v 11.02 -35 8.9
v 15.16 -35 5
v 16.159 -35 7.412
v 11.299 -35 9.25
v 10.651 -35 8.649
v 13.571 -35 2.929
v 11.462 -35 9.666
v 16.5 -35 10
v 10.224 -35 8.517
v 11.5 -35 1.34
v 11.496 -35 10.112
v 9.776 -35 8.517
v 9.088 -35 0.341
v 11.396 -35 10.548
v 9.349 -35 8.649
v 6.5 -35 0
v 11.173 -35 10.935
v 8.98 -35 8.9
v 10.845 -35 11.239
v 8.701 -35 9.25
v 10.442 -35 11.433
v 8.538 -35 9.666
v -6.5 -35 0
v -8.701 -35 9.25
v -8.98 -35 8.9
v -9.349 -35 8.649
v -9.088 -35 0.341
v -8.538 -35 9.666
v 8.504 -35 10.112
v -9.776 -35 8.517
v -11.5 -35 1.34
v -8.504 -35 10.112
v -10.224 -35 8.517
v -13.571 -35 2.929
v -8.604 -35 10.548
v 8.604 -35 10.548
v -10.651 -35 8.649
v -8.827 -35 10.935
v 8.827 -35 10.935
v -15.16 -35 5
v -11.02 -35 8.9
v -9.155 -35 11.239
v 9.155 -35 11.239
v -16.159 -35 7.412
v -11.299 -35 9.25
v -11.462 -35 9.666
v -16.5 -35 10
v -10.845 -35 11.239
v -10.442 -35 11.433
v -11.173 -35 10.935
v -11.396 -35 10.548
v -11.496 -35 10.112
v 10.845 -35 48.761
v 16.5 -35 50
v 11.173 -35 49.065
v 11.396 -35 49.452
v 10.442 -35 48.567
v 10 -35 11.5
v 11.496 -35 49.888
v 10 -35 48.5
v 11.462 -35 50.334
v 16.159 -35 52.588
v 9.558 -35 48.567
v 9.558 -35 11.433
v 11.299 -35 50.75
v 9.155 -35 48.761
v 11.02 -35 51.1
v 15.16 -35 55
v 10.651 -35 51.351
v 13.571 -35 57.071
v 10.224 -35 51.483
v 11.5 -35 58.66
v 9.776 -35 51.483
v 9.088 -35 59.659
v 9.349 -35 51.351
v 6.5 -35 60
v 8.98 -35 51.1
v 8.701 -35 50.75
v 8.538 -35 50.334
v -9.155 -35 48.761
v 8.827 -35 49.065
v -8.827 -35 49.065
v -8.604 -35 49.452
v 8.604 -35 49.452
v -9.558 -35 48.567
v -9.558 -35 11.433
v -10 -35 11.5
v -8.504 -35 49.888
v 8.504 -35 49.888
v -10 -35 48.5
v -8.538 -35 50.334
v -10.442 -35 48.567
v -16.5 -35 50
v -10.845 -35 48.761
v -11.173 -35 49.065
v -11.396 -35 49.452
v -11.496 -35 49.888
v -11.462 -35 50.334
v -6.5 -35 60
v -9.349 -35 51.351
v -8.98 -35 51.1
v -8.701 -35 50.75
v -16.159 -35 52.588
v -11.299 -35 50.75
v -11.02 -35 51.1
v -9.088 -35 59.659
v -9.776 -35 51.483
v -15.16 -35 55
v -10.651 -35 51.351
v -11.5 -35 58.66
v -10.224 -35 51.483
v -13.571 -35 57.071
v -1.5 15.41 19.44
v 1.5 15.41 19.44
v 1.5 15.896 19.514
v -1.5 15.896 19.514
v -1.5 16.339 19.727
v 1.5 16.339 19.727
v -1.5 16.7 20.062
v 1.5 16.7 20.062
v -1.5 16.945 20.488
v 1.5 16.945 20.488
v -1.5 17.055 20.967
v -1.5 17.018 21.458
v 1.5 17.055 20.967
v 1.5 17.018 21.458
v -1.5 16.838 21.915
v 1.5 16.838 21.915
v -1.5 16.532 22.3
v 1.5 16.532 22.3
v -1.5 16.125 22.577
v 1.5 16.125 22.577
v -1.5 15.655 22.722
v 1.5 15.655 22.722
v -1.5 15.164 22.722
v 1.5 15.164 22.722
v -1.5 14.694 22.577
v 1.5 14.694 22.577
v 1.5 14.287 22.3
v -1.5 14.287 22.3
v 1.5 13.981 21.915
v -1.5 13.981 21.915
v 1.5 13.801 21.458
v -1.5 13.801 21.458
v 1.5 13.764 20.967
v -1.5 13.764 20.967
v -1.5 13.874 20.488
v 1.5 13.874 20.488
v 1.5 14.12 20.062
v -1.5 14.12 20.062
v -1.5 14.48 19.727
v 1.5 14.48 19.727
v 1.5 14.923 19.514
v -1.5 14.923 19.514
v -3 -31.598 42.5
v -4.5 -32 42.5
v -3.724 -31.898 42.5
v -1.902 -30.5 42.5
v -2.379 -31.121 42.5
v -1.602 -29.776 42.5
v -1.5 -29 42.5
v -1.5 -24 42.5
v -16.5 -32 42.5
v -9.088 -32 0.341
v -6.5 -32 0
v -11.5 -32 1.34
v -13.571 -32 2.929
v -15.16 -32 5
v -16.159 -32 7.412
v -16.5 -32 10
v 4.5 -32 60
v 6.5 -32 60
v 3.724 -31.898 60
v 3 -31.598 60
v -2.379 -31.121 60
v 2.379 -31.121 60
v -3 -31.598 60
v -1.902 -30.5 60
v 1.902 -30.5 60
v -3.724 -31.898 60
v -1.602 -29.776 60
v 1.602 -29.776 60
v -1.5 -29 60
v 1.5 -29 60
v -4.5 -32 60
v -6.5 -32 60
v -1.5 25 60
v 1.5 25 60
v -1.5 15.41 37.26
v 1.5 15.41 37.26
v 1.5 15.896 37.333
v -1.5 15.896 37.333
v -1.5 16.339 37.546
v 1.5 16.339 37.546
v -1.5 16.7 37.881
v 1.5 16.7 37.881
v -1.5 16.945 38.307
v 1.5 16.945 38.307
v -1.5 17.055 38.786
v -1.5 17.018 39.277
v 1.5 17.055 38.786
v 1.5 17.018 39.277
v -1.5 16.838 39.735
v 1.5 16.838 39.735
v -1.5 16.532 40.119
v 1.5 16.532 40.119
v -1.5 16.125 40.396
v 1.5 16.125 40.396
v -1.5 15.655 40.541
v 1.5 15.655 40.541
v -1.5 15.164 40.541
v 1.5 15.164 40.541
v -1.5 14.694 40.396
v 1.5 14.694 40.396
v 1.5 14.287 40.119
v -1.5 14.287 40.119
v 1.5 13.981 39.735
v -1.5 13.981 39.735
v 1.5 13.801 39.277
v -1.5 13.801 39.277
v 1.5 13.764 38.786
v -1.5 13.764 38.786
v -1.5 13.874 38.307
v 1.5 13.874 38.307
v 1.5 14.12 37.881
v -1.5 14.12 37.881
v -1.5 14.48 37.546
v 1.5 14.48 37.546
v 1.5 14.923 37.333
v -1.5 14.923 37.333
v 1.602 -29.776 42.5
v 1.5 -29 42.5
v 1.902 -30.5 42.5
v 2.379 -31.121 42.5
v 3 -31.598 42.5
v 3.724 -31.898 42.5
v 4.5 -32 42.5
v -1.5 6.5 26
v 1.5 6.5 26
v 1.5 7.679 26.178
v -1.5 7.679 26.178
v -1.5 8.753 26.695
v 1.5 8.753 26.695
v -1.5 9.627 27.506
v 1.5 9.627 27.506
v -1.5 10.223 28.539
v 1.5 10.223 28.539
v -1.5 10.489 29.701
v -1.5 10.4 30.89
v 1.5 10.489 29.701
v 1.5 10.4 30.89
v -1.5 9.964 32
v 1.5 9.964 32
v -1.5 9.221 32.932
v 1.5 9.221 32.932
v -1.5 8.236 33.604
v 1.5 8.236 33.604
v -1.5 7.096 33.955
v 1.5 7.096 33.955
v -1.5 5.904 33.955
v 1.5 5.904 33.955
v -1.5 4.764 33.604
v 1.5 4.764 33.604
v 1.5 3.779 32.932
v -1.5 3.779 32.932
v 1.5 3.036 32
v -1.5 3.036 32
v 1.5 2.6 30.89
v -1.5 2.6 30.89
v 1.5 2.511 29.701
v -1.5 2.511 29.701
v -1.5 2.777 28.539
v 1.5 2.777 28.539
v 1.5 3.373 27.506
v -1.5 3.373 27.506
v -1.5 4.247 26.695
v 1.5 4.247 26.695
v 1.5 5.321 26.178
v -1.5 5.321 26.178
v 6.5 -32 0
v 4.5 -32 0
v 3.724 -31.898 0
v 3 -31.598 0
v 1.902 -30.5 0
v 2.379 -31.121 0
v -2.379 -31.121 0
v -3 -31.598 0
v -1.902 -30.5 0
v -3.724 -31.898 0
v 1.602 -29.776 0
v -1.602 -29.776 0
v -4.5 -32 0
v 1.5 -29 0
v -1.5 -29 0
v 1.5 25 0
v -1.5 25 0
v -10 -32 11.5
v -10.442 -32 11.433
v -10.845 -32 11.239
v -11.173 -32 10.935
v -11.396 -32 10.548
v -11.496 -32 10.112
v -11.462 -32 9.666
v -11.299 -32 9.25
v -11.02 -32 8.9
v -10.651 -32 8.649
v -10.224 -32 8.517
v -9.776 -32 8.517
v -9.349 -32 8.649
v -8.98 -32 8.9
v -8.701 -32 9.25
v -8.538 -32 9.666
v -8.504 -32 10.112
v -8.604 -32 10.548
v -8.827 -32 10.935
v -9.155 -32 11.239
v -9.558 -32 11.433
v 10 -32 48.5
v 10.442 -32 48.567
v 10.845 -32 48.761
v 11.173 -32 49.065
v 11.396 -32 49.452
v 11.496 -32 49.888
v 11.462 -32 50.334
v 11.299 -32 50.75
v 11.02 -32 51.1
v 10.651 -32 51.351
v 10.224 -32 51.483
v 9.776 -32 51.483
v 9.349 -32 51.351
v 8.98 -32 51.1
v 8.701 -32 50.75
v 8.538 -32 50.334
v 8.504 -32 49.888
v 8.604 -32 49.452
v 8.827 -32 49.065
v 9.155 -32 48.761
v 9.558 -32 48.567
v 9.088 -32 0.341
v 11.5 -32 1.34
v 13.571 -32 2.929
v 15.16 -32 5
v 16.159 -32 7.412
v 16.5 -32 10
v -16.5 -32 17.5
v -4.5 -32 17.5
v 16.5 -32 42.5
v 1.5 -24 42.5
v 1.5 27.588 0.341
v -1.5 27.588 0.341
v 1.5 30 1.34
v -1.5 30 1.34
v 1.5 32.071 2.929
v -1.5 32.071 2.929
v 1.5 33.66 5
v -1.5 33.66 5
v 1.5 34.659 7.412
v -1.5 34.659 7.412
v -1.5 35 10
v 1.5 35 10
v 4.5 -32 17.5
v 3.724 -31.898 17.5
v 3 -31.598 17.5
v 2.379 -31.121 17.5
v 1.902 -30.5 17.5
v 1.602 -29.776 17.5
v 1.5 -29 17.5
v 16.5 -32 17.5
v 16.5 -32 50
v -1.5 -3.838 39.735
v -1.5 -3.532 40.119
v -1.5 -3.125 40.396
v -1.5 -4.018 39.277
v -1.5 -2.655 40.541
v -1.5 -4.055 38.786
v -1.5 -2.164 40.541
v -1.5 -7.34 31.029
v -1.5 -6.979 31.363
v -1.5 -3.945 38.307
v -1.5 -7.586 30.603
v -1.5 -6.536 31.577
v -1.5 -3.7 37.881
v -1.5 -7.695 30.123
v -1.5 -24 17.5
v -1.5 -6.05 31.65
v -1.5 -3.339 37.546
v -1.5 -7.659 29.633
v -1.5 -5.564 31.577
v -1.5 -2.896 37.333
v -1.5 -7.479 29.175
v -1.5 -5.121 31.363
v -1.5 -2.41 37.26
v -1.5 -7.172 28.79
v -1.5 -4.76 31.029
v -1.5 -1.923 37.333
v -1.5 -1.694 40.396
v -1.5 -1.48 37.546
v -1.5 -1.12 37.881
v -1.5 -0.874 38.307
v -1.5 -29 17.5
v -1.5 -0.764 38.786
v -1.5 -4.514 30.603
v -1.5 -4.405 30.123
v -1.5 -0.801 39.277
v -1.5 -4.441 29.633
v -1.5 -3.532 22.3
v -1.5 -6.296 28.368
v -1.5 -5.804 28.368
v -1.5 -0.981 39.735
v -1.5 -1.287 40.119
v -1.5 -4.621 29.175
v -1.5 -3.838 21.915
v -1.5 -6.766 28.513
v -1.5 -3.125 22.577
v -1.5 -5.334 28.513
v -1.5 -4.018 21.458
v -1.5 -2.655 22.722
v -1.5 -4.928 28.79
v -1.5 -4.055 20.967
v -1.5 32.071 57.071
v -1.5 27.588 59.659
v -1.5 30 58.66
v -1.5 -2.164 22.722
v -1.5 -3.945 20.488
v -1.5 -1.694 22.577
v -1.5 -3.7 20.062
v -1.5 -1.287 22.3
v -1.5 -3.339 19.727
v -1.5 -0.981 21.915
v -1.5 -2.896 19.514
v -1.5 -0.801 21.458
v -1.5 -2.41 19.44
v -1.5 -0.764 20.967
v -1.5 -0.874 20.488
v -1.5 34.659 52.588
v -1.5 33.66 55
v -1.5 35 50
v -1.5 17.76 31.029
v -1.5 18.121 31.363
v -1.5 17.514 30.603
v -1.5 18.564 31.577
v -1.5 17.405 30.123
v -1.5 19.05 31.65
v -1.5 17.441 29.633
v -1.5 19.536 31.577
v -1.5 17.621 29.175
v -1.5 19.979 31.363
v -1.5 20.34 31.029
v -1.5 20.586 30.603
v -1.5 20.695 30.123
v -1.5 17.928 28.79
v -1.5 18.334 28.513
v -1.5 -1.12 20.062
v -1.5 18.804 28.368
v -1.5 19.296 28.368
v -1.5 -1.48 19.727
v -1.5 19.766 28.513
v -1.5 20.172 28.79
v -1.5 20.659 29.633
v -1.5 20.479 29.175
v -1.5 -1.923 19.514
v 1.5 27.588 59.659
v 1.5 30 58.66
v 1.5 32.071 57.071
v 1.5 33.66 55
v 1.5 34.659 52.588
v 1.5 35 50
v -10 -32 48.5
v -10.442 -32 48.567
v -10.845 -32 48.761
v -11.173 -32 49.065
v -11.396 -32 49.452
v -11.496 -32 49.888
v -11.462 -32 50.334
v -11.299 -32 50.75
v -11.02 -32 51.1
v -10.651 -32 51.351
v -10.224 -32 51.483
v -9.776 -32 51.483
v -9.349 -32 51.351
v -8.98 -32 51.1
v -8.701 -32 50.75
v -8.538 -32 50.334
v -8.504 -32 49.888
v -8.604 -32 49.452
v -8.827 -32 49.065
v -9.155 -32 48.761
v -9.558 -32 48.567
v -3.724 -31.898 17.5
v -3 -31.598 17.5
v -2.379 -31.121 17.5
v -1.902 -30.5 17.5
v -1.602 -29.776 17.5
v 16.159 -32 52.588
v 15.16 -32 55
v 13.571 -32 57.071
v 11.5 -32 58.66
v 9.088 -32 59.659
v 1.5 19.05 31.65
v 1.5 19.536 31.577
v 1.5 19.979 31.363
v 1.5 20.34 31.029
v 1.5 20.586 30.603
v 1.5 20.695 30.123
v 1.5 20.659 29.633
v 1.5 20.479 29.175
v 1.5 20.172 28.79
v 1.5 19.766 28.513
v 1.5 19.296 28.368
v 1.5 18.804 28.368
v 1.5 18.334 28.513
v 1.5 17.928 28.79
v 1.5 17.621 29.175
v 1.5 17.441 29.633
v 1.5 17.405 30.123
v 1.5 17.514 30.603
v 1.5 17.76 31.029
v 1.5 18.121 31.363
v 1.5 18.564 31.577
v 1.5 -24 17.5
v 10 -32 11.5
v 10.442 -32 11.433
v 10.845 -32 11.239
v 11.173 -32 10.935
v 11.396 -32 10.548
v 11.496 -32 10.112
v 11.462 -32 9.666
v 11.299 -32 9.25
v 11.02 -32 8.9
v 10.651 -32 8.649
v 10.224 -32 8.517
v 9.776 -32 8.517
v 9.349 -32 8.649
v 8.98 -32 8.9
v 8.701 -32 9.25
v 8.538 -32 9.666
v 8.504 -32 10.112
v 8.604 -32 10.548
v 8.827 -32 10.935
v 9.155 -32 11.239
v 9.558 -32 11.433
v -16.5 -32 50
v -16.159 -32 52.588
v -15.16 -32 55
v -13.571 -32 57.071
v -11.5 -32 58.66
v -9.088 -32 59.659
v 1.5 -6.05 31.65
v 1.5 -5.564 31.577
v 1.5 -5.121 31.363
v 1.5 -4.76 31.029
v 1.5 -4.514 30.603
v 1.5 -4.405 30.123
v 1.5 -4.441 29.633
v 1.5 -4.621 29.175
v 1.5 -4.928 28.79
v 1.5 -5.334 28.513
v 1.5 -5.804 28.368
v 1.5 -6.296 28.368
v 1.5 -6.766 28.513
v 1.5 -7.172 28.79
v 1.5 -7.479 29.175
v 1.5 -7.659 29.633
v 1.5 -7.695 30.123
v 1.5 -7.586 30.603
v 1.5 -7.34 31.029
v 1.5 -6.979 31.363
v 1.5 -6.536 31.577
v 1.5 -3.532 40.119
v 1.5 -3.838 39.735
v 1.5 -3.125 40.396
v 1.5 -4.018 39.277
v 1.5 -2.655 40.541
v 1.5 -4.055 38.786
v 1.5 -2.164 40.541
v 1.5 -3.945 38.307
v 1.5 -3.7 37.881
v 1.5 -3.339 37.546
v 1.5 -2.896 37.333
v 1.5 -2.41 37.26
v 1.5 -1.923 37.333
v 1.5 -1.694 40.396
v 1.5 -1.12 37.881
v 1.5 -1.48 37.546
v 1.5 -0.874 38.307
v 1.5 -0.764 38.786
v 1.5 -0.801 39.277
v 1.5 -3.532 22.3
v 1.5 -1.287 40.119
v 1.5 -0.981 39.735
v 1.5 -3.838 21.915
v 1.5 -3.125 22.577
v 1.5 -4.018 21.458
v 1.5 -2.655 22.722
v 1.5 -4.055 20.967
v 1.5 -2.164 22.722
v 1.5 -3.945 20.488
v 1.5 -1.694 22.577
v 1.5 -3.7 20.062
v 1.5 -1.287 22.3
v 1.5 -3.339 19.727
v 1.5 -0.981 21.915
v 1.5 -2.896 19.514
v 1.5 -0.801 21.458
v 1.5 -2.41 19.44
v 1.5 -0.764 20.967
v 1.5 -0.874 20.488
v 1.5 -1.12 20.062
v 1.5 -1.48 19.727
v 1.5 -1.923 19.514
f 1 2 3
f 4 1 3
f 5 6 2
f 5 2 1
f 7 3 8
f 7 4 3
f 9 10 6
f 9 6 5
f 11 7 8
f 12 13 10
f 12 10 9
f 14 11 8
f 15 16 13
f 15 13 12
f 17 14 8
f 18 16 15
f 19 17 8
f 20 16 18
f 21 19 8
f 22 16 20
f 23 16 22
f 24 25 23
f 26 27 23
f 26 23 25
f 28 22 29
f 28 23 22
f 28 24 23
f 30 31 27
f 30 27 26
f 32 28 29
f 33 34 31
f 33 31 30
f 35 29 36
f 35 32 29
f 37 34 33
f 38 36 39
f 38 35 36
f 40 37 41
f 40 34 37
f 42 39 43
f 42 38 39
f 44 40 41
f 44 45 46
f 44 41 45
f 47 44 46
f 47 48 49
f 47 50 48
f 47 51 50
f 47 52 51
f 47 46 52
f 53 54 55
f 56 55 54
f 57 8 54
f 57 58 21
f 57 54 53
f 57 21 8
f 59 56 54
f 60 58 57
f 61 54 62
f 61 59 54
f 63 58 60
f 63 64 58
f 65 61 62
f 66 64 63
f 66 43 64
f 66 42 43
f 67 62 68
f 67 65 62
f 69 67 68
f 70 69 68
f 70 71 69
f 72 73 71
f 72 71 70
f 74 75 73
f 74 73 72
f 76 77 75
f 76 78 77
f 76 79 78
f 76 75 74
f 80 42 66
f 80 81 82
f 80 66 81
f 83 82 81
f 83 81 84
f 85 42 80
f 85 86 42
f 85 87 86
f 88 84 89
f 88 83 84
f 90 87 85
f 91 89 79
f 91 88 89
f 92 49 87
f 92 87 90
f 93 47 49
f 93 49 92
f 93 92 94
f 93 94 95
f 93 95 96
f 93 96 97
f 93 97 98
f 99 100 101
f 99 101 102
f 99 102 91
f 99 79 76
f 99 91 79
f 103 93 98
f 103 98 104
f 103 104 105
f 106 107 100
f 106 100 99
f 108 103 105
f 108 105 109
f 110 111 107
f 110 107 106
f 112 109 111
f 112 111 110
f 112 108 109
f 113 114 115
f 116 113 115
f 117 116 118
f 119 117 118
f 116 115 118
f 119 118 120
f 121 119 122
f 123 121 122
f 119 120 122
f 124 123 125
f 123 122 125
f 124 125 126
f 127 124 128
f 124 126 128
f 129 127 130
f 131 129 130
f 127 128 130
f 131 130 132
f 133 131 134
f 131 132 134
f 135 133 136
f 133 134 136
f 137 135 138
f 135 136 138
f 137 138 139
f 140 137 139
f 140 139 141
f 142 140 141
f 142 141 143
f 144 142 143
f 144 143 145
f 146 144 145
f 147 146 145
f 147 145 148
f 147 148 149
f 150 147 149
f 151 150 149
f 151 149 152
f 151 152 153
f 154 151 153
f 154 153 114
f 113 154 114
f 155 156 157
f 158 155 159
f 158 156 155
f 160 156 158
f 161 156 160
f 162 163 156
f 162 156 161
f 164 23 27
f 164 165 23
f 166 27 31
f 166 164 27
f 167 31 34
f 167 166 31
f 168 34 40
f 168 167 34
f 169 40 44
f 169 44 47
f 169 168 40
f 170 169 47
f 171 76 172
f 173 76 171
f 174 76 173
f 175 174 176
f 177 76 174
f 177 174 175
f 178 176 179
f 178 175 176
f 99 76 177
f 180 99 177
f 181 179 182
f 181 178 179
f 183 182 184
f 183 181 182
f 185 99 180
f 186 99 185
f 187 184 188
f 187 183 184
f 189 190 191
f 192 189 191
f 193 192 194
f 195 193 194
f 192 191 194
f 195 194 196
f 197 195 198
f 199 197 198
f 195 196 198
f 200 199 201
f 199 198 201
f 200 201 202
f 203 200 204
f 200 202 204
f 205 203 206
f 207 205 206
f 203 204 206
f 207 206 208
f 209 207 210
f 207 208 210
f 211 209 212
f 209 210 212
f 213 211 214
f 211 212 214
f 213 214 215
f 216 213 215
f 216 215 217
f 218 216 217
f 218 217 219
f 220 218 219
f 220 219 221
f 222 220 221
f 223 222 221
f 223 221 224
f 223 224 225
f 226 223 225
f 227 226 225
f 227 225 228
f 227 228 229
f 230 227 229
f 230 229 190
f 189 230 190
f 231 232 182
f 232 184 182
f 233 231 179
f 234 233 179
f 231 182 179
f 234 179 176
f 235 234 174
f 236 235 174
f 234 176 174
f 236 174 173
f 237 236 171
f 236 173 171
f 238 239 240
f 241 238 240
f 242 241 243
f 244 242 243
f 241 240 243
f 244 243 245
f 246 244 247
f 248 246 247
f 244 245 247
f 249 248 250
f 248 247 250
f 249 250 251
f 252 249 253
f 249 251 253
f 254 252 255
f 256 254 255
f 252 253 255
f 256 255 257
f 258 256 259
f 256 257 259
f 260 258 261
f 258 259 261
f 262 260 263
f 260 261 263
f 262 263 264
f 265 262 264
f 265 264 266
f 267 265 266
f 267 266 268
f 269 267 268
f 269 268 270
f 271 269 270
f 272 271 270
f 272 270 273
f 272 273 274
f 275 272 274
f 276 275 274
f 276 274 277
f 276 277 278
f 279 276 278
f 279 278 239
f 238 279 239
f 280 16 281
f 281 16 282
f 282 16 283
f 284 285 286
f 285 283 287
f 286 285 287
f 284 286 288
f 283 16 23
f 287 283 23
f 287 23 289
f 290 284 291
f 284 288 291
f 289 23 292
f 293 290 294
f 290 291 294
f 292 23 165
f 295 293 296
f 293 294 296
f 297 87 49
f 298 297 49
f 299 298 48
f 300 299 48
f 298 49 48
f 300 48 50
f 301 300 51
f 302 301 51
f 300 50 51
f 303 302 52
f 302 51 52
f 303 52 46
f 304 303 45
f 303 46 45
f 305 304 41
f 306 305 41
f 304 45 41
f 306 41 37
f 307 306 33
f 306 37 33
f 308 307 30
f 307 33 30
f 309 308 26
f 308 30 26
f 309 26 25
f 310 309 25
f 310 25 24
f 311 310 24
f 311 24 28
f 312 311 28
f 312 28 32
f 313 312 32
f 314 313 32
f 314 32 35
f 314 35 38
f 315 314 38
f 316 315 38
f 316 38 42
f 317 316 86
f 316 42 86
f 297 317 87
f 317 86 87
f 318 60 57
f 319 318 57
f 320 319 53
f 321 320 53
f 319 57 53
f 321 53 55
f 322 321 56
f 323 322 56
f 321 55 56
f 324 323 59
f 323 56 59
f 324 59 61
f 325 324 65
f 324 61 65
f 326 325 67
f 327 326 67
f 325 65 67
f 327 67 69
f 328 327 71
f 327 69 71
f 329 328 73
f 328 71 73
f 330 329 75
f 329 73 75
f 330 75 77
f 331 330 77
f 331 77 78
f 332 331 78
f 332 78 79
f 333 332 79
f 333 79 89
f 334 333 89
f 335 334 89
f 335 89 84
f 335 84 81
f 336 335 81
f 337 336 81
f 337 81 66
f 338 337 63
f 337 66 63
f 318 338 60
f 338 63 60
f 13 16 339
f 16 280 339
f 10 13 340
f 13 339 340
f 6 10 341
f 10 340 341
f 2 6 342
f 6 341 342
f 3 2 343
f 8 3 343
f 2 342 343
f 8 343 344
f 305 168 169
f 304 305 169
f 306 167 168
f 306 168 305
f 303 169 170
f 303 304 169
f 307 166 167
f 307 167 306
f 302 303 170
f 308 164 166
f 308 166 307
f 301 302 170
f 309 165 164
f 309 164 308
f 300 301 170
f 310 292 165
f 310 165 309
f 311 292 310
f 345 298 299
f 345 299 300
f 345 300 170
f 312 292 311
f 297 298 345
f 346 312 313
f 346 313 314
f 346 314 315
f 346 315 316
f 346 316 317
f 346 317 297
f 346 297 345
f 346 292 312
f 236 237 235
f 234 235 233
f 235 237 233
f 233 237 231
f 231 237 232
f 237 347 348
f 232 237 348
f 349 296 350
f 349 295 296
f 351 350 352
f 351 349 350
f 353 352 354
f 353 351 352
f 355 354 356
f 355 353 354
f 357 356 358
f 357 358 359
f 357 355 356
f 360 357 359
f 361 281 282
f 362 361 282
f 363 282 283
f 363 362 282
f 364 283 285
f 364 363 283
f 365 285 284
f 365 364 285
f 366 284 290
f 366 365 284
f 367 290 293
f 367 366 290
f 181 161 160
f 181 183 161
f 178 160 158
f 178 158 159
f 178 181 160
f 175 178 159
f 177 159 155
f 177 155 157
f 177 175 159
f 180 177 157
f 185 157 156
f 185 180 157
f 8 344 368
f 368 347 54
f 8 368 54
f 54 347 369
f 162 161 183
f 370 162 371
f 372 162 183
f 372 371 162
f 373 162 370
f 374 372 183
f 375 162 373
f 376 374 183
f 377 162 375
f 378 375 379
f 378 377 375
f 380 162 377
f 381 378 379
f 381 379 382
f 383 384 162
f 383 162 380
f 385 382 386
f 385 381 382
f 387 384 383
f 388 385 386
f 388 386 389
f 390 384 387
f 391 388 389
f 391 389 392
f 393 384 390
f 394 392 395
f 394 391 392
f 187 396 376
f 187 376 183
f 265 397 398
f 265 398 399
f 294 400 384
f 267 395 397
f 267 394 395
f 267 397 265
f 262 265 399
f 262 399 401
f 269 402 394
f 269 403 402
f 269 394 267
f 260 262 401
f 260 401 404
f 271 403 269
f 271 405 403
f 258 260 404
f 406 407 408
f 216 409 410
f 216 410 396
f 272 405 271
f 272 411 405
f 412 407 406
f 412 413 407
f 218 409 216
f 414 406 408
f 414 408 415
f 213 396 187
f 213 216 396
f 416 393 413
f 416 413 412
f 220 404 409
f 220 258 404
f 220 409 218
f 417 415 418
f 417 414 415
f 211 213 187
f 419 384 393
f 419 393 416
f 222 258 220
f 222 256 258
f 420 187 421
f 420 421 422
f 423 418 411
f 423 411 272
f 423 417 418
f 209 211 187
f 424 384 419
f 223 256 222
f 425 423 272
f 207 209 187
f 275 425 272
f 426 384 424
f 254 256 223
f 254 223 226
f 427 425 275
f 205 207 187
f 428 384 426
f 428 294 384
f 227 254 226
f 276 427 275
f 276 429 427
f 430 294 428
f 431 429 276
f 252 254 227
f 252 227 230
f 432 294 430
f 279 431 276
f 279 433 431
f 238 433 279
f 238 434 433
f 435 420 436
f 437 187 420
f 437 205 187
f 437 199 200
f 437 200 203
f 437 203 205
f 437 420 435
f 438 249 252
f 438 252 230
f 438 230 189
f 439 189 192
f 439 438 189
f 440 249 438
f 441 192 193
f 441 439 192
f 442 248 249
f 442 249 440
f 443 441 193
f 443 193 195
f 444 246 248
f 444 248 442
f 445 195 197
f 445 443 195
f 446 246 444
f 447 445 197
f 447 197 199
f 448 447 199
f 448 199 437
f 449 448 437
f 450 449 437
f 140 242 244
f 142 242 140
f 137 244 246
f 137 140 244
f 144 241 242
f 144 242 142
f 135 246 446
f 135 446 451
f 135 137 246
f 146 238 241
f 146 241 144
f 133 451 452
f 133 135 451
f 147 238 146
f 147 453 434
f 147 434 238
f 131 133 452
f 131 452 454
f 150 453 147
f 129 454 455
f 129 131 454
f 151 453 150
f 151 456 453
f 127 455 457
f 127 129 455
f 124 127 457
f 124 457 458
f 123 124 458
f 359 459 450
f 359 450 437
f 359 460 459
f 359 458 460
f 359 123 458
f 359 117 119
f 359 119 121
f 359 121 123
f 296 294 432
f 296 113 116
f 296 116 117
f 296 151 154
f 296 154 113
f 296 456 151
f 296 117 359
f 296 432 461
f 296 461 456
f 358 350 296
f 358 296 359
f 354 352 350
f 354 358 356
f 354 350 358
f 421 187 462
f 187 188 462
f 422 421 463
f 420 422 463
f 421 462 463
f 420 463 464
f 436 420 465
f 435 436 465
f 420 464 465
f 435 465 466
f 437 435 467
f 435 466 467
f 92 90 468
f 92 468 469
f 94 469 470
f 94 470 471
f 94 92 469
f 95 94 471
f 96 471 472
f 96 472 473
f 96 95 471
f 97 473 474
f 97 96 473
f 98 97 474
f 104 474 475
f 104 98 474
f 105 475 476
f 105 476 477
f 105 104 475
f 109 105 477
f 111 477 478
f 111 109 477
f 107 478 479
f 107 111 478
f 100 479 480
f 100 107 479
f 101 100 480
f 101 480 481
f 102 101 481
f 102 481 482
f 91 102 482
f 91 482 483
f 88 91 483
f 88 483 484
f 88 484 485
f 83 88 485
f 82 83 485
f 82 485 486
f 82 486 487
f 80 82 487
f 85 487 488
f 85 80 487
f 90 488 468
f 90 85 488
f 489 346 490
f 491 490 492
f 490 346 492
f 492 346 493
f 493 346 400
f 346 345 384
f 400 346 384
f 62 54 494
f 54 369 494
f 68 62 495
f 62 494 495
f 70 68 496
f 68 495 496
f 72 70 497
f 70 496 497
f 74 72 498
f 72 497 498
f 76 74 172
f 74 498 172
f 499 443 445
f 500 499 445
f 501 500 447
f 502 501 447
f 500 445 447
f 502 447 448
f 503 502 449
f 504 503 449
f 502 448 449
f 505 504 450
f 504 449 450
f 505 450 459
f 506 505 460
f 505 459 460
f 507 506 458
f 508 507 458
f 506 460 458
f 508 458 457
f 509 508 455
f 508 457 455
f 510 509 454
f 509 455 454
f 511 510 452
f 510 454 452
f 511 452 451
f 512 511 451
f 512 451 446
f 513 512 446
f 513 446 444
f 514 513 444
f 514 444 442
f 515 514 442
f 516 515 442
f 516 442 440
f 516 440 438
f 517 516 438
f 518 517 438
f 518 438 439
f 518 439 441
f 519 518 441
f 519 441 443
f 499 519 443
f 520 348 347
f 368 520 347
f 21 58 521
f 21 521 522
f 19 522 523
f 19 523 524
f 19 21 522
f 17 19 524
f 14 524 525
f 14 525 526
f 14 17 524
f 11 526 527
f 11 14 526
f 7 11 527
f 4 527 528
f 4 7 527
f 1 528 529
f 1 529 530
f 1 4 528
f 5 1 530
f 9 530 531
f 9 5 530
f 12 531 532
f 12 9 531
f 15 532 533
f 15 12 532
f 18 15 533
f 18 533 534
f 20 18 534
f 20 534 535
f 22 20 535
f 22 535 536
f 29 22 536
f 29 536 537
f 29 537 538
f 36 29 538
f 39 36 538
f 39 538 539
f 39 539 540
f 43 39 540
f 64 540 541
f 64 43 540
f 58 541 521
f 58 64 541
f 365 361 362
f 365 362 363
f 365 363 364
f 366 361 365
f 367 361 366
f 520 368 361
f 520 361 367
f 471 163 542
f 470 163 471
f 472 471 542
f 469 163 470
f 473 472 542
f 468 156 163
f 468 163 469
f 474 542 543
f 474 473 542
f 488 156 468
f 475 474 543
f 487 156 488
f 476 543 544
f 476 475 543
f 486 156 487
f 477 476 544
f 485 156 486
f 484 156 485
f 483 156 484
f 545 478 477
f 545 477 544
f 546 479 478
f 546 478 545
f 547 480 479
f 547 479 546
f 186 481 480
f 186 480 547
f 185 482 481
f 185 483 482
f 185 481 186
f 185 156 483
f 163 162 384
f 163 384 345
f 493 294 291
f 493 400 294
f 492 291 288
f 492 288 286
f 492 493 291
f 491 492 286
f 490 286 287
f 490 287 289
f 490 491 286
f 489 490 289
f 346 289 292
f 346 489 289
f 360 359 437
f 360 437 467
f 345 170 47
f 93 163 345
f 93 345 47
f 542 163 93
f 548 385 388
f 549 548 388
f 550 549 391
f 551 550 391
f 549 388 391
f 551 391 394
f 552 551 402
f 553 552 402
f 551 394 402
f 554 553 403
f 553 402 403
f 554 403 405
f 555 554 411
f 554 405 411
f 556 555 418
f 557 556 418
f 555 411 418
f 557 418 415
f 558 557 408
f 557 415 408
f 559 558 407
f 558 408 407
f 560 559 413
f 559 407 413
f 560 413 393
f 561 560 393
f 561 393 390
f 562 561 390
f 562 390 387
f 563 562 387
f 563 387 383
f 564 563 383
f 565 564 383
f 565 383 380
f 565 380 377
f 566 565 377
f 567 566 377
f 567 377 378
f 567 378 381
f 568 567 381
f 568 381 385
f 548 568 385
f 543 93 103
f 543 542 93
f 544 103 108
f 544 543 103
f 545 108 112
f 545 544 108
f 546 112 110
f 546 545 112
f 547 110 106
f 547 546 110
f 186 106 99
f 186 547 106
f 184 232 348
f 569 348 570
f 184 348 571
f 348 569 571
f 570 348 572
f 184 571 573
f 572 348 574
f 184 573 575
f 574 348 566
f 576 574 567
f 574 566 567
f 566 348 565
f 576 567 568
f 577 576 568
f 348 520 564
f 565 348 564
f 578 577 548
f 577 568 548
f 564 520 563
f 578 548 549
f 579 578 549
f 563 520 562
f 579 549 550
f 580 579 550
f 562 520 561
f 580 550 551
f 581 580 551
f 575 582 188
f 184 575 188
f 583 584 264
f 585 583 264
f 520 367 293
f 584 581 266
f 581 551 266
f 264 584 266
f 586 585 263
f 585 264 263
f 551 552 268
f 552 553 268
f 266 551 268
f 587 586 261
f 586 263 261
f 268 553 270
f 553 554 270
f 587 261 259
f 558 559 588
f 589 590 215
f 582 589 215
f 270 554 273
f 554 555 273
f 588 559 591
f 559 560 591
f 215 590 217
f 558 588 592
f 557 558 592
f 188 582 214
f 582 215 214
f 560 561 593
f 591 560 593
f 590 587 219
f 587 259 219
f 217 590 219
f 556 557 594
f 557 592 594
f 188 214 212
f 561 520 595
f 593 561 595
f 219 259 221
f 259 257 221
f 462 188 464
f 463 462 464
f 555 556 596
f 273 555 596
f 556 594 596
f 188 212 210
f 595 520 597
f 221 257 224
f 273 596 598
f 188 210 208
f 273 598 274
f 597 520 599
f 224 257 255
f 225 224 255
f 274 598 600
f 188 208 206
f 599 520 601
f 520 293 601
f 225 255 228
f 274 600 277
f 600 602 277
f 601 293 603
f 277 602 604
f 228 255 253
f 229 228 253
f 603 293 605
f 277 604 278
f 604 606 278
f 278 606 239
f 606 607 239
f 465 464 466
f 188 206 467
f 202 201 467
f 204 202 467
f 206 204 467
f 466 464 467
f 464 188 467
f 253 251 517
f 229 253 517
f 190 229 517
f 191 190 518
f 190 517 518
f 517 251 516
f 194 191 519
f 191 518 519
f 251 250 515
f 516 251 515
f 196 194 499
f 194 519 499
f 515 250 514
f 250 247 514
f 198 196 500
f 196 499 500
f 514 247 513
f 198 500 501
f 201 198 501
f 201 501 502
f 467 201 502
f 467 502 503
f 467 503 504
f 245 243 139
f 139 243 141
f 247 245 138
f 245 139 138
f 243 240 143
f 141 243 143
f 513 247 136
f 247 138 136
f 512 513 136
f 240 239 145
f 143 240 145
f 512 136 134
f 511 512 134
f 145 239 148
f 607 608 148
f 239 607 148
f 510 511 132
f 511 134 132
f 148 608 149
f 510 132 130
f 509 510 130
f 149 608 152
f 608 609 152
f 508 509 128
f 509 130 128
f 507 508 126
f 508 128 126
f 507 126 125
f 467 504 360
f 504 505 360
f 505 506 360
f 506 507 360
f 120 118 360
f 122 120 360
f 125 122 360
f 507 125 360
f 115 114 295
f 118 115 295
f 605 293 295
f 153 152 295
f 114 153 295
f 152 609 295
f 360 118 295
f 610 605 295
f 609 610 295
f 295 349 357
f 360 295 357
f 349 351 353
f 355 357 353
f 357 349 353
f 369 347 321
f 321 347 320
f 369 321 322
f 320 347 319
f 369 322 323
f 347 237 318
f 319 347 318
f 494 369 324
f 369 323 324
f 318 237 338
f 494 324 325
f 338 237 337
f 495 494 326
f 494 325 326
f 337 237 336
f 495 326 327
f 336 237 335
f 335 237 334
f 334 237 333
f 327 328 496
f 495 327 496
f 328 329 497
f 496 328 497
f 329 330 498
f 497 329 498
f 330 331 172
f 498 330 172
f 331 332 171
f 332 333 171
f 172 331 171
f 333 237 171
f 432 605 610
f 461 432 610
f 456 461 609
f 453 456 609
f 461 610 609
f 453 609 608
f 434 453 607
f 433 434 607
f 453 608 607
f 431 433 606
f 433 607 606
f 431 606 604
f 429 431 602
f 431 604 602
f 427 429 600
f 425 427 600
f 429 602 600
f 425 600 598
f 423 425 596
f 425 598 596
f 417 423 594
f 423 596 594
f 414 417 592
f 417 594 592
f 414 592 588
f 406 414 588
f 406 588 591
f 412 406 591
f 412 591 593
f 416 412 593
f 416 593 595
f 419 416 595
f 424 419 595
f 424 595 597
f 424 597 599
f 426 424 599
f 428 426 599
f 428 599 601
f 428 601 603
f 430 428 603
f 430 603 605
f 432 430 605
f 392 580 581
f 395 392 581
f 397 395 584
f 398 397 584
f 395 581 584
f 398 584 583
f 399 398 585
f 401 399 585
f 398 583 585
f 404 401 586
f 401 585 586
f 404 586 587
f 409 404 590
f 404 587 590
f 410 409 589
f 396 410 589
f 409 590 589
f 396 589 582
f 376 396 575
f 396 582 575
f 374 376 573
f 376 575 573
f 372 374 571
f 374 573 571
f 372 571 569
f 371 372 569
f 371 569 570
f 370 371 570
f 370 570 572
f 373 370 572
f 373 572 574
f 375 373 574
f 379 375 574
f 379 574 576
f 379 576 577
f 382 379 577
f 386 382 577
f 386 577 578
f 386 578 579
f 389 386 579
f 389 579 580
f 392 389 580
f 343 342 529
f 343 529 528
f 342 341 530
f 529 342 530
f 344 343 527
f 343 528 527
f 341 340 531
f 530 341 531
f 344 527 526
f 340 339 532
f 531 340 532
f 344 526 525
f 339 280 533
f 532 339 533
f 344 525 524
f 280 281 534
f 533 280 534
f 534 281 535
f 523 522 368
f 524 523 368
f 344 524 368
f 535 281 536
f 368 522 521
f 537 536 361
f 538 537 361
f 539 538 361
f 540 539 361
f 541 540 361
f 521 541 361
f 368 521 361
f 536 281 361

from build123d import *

# Parameters (mm, degrees)
SKETCH_1_W               = 3
SKETCH_1_H               = 70
EXTRUDE_1_DEPTH          = 60
SKETCH_2_W               = 60
SKETCH_2_H               = 3
EXTRUDE_2_DEPTH          = 15
FILLET_2_R               = 10
CUT_EXTRUDE_1_REACH      = 73.757
SKETCH_3_R               = 1.65
SKETCH_3_R_2             = 4
SKETCH_5_R               = 1.5
CUT_EXTRUDE_4_DEPTH      = 3
FILLET_3_R               = 10
MIRROR_3_COPY_1_SKETCH_R = 1.5
MIRROR_3_COPY_1_DEPTH    = 3
MIRROR_3_COPY_2_SKETCH_R = 1.5
MIRROR_3_COPY_2_DEPTH    = 3
SKETCH_7_R               = 1.65
CUT_EXTRUDE_5_DEPTH      = 10
EXTRUDE_3_DEPTH          = 12.5
FILLET_4_R               = 3


with BuildPart() as part:
    # 草图1 → 凸台-拉伸1 (new body)
    with BuildSketch(Plane.XY):
        Rectangle(SKETCH_1_W, SKETCH_1_H)
    extrude(amount=EXTRUDE_1_DEPTH)

    # 草图2 → 凸台-拉伸2 (add)
    with BuildSketch(Plane.ZY.offset(1.5)):
        with Locations((30, -33.5)):
            Rectangle(SKETCH_2_W, SKETCH_2_H)
    extrude_2 = extrude(amount=EXTRUDE_2_DEPTH)

    # 镜向1: 凸台-拉伸2 across plane
    add(extrude_2.mirror(Plane(origin=(0, 0, 0), x_dir=(0, 0, 1), z_dir=(1, 0, 0))))

    # 圆角2
    fillet_2_edges = [part.edges().sort_by_distance(p)[0] for p in [
        (0, 35, 0),
        (0, 35, 60),
    ]]
    fillet(fillet_2_edges, radius=FILLET_2_R)

    # 草图3 → 切除-拉伸1 (cut, up to next)
    with BuildSketch(Plane(origin=(1.5, 0, 0), x_dir=(0, 0, -1), z_dir=(1, 0, 0)), mode=Mode.PRIVATE) as cut_extrude_1_sk1:
        with Locations((-38.909545443, -2.409545443)):
            Circle(SKETCH_3_R)
    cut_extrude_1_tool1 = extrude(cut_extrude_1_sk1.sketch, amount=-CUT_EXTRUDE_1_REACH, mode=Mode.PRIVATE) & part.part
    # 草图3 → 切除-拉伸1 (cut, up to next)
    with BuildSketch(Plane(origin=(1.5, 0, 0), x_dir=(0, 0, -1), z_dir=(1, 0, 0)), mode=Mode.PRIVATE) as cut_extrude_1_sk2:
        with Locations((-21.090454557, -2.409545443)):
            Circle(SKETCH_3_R)
    cut_extrude_1_tool2 = extrude(cut_extrude_1_sk2.sketch, amount=-CUT_EXTRUDE_1_REACH, mode=Mode.PRIVATE) & part.part
    # 草图3 → 切除-拉伸1 (cut, up to next)
    with BuildSketch(Plane(origin=(1.5, 0, 0), x_dir=(0, 0, -1), z_dir=(1, 0, 0)), mode=Mode.PRIVATE) as cut_extrude_1_sk3:
        with Locations((-30, 6.5)):
            Circle(SKETCH_3_R_2)
    cut_extrude_1_tool3 = extrude(cut_extrude_1_sk3.sketch, amount=-CUT_EXTRUDE_1_REACH, mode=Mode.PRIVATE) & part.part
    # 草图3 → 切除-拉伸1 (cut, up to next)
    with BuildSketch(Plane(origin=(1.5, 0, 0), x_dir=(0, 0, -1), z_dir=(1, 0, 0)), mode=Mode.PRIVATE) as cut_extrude_1_sk4:
        with Locations((-38.909545443, 15.409545443)):
            Circle(SKETCH_3_R)
    cut_extrude_1_tool4 = extrude(cut_extrude_1_sk4.sketch, amount=-CUT_EXTRUDE_1_REACH, mode=Mode.PRIVATE) & part.part
    # 草图3 → 切除-拉伸1 (cut, up to next)
    with BuildSketch(Plane(origin=(1.5, 0, 0), x_dir=(0, 0, -1), z_dir=(1, 0, 0)), mode=Mode.PRIVATE) as cut_extrude_1_sk5:
        with Locations((-21.090454557, 15.409545443)):
            Circle(SKETCH_3_R)
    cut_extrude_1_tool5 = extrude(cut_extrude_1_sk5.sketch, amount=-CUT_EXTRUDE_1_REACH, mode=Mode.PRIVATE) & part.part
    add(cut_extrude_1_tool1.solids().sort_by_distance((1.5, -2.409545, 38.909545))[0], mode=Mode.SUBTRACT)
    add(cut_extrude_1_tool2.solids().sort_by_distance((1.5, -2.409545, 21.090455))[0], mode=Mode.SUBTRACT)
    add(cut_extrude_1_tool3.solids().sort_by_distance((1.5, 6.5, 30))[0], mode=Mode.SUBTRACT)
    add(cut_extrude_1_tool4.solids().sort_by_distance((1.5, 15.409545, 38.909545))[0], mode=Mode.SUBTRACT)
    add(cut_extrude_1_tool5.solids().sort_by_distance((1.5, 15.409545, 21.090455))[0], mode=Mode.SUBTRACT)

    # 草图5 → 切除-拉伸4 (cut)
    with BuildSketch(Plane(origin=(0, -35, 0), x_dir=(1, 0, 0), z_dir=(0, 1, 0))):
        with Locations(Location((10, -10, 0), (0, 0, 270))):
            Circle(SKETCH_5_R)
    cut_extrude_4 = extrude(amount=CUT_EXTRUDE_4_DEPTH, mode=Mode.SUBTRACT)

    # 圆角3
    fillet_3_edges = [part.edges().sort_by_distance(p)[0] for p in [
        (-16.5, -33.5, 0),
        (-16.5, -33.5, 60),
        (16.5, -33.5, 60),
        (16.5, -33.5, 0),
    ]]
    fillet(fillet_3_edges, radius=FILLET_3_R)

    # 镜向2: 切除-拉伸4 across plane
    add(cut_extrude_4.mirror(Plane(origin=(0, 0, 0), x_dir=(0, 0, 1), z_dir=(1, 0, 0))), mode=Mode.SUBTRACT)

    # 镜向2 at the second plane: 切除-拉伸4 across plane
    add(cut_extrude_4.mirror(Plane.ZX), mode=Mode.SUBTRACT)

    # 镜向3: 切除-拉伸4 across plane
    add(cut_extrude_4.mirror(Plane.XY.offset(30)), mode=Mode.SUBTRACT)

    # 镜向3 copy 1 sketch → 镜向3 copy 1 (cut)
    with BuildSketch(Plane(origin=(0, -35, 60), x_dir=(-1, 0, 0), z_dir=(0, 1, 0))):
        with Locations(Location((10, -10, 0), (0, 0, 270))):
            Circle(MIRROR_3_COPY_1_SKETCH_R)
    extrude(amount=MIRROR_3_COPY_1_DEPTH, mode=Mode.SUBTRACT)

    # 镜向3 copy 2 sketch → 镜向3 copy 2 (cut)
    with BuildSketch(Plane(origin=(0, 35, 60), x_dir=(1, 0, 0), z_dir=(0, -1, 0))):
        with Locations(Location((10, -10, 0), (0, 0, 270))):
            Circle(MIRROR_3_COPY_2_SKETCH_R)
    extrude(amount=MIRROR_3_COPY_2_DEPTH, mode=Mode.SUBTRACT)

    # 草图7 → 切除-拉伸5 (cut)
    with BuildSketch(Plane.ZY.offset(1.5)):
        with Locations((30, 19.05)):
            Circle(SKETCH_7_R)
        with Locations((30, -6.05)):
            Circle(SKETCH_7_R)
    extrude(amount=-CUT_EXTRUDE_5_DEPTH, mode=Mode.SUBTRACT)

    # 草图8 → 凸台-拉伸3 (add, symmetric)
    with BuildSketch(Plane.XY.offset(30)):
        Polygon((1.5, -24), (16.5, -32), (1.5, -32), align=None)
    extrude_3 = extrude(amount=EXTRUDE_3_DEPTH, both=True)

    # 镜向4: 凸台-拉伸3 across plane
    add(extrude_3.mirror(Plane(origin=(0, 0, 0), x_dir=(0, 0, 1), z_dir=(1, 0, 0))))

    # 圆角4
    fillet_4_edges = [part.edges().sort_by_distance(p)[0] for p in [
        (1.5, -32, 51.25),
        (-1.5, -32, 51.25),
        (-1.5, -32, 8.75),
        (1.5, -32, 8.75),
    ]]
    fillet(fillet_4_edges, radius=FILLET_4_R)


solid = part.part
